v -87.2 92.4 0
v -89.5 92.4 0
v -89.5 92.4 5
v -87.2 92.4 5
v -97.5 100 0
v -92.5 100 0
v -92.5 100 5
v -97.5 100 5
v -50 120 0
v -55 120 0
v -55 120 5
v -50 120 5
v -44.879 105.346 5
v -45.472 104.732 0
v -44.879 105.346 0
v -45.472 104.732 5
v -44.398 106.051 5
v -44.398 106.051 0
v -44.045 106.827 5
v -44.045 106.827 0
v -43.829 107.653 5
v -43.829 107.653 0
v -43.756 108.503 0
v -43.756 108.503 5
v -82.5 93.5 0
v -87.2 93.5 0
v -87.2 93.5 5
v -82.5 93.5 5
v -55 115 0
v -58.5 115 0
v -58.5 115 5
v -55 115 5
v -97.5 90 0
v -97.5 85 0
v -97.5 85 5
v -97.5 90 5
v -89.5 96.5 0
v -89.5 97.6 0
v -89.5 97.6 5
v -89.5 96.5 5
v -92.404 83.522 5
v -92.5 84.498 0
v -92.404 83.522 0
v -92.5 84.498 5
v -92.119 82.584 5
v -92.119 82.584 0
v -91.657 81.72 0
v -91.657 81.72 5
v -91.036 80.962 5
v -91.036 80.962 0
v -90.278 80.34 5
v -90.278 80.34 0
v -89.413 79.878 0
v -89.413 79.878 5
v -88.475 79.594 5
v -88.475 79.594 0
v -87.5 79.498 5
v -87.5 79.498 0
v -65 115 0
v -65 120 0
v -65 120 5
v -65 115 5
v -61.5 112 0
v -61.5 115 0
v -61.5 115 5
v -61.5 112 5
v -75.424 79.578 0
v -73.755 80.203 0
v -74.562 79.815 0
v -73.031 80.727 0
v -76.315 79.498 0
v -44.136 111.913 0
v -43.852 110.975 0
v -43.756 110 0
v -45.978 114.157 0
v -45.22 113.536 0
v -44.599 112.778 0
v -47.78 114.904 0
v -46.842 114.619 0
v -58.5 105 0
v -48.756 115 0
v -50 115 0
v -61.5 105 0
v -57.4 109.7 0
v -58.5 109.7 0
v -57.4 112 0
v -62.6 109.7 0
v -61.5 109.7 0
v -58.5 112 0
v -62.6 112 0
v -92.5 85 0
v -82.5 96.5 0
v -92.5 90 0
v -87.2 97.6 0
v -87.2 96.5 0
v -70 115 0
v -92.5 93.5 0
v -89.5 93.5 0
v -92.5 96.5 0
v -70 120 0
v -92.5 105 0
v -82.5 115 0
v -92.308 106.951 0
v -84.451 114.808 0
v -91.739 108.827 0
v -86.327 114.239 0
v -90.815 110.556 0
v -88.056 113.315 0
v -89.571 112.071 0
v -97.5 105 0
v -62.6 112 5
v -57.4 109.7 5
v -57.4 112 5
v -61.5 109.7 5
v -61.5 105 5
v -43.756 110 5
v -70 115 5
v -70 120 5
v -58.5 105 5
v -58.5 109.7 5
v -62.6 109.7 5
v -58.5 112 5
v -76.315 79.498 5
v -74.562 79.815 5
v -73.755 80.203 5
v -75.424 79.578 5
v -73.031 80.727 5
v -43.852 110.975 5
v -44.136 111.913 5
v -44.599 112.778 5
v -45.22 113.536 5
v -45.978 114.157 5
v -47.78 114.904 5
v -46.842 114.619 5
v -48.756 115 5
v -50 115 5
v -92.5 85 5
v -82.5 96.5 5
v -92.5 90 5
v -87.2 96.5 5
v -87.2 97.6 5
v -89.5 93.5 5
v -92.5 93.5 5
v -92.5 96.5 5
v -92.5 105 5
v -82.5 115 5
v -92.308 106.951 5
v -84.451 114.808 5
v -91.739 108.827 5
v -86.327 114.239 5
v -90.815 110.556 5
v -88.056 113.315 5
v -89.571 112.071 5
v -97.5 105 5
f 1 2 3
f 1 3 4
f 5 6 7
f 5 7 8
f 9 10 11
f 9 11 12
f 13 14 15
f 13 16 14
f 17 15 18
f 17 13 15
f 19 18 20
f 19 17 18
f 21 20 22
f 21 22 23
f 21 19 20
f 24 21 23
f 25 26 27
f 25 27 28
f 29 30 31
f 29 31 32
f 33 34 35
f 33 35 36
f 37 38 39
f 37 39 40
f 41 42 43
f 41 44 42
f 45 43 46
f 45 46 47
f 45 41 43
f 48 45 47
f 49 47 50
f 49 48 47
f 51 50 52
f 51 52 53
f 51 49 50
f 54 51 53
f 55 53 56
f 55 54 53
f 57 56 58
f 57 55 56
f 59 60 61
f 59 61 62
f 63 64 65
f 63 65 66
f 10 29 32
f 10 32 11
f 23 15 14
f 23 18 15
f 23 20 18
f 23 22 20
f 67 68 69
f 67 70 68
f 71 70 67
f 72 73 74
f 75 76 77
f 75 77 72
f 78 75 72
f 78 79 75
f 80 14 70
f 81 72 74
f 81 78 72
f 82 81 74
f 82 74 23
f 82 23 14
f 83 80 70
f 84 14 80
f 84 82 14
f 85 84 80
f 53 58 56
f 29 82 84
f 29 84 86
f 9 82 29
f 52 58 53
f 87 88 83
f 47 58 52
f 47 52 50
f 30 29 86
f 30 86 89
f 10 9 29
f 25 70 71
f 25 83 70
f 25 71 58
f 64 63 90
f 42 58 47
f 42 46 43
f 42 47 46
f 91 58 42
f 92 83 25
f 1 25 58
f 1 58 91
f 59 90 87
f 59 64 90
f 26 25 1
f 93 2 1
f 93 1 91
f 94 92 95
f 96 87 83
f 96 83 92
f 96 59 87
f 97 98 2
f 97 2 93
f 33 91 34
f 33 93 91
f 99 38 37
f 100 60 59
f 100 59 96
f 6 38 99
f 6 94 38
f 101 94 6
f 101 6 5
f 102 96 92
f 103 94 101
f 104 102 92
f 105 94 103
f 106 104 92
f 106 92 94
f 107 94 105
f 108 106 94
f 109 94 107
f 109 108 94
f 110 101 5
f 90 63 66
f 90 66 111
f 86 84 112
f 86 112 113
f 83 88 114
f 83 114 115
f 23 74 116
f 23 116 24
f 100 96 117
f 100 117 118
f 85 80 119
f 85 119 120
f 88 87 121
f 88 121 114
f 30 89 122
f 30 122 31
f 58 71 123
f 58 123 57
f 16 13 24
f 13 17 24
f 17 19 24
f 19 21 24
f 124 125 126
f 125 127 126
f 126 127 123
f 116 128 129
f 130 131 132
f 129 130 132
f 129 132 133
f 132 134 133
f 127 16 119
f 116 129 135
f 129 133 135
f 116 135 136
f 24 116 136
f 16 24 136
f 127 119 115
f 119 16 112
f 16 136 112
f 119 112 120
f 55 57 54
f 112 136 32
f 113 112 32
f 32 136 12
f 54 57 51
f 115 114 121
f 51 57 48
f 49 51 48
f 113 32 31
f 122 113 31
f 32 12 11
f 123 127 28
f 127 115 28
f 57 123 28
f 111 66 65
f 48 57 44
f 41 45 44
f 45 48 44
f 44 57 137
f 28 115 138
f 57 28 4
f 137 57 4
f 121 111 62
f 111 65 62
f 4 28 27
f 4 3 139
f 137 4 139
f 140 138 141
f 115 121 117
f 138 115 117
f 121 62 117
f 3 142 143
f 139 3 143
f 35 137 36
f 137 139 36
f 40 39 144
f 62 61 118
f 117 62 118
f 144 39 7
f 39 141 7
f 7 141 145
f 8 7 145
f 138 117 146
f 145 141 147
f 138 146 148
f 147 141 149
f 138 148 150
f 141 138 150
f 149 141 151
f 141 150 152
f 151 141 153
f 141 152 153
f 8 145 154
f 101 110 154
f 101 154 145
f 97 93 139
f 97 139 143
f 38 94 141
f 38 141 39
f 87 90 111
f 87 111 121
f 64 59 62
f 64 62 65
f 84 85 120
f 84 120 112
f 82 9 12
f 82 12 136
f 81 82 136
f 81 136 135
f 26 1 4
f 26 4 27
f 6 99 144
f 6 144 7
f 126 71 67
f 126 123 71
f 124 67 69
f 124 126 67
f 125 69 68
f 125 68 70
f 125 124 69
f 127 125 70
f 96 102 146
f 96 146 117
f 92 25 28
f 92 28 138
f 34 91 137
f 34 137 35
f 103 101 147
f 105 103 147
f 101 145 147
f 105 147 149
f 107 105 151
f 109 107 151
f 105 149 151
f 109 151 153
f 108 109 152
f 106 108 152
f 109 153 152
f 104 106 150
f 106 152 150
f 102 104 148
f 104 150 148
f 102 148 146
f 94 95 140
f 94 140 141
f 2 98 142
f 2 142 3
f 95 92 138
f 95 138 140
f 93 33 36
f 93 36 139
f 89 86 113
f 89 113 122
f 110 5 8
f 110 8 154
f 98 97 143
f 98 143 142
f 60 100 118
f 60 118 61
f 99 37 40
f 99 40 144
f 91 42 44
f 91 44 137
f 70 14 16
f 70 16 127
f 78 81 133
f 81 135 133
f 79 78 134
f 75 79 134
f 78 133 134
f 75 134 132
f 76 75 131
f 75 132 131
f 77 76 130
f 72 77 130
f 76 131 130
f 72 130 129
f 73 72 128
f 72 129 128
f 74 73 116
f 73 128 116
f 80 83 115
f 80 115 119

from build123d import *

# Parameters (mm, degrees)
BOSS_EXTRUDE1_DEPTH = 5
FILLET1_R           = 10
FILLET2_R           = 5


with BuildPart() as part:
    # Sketch1 → Boss-Extrude1 (new body)
    with BuildSketch(Plane.XY):
        Polygon((-92.5, 96.5), (-92.5, 100), (-97.5, 100), (-97.5, 105), (-92.5, 105), (-92.5, 115), (-70, 115), (-70, 120), (-65, 120), (-65, 115), (-61.5, 115), (-61.5, 112), (-62.6, 112), (-62.6, 109.7), (-61.5, 109.7), (-61.5, 105), (-58.5, 105), (-58.5, 109.7), (-57.4, 109.7), (-57.4, 112), (-58.5, 112), (-58.5, 115), (-55, 115), (-55, 120), (-50, 120), (-50, 115), (-43.75587644, 115), (-43.75587644, 106.227080611), (-74.442868217, 79.497668649), (-92.5, 79.497668649), (-92.5, 85), (-97.5, 85), (-97.5, 90), (-92.5, 90), (-92.5, 93.5), (-89.5, 93.5), (-89.5, 92.4), (-87.2, 92.4), (-87.2, 93.5), (-82.5, 93.5), (-82.5, 96.5), (-87.2, 96.5), (-87.2, 97.6), (-89.5, 97.6), (-89.5, 96.5), align=None)
    extrude(amount=BOSS_EXTRUDE1_DEPTH)

    # Fillet1
    fillet1_edges = [part.edges().sort_by_distance(p)[0] for p in [
        (-92.5, 115, 2.5),
    ]]
    fillet(fillet1_edges, radius=FILLET1_R - 0.0001)  # a hair under: the kernel refuses the full size

    # Fillet2
    fillet2_edges = [part.edges().sort_by_distance(p)[0] for p in [
        (-43.75587644, 115, 2.5),
        (-43.75587644, 106.227080611, 2.5),
        (-74.442868217, 79.497668649, 2.5),
        (-92.5, 79.497668649, 2.5),
    ]]
    fillet(fillet2_edges, radius=FILLET2_R)


solid = part.part
